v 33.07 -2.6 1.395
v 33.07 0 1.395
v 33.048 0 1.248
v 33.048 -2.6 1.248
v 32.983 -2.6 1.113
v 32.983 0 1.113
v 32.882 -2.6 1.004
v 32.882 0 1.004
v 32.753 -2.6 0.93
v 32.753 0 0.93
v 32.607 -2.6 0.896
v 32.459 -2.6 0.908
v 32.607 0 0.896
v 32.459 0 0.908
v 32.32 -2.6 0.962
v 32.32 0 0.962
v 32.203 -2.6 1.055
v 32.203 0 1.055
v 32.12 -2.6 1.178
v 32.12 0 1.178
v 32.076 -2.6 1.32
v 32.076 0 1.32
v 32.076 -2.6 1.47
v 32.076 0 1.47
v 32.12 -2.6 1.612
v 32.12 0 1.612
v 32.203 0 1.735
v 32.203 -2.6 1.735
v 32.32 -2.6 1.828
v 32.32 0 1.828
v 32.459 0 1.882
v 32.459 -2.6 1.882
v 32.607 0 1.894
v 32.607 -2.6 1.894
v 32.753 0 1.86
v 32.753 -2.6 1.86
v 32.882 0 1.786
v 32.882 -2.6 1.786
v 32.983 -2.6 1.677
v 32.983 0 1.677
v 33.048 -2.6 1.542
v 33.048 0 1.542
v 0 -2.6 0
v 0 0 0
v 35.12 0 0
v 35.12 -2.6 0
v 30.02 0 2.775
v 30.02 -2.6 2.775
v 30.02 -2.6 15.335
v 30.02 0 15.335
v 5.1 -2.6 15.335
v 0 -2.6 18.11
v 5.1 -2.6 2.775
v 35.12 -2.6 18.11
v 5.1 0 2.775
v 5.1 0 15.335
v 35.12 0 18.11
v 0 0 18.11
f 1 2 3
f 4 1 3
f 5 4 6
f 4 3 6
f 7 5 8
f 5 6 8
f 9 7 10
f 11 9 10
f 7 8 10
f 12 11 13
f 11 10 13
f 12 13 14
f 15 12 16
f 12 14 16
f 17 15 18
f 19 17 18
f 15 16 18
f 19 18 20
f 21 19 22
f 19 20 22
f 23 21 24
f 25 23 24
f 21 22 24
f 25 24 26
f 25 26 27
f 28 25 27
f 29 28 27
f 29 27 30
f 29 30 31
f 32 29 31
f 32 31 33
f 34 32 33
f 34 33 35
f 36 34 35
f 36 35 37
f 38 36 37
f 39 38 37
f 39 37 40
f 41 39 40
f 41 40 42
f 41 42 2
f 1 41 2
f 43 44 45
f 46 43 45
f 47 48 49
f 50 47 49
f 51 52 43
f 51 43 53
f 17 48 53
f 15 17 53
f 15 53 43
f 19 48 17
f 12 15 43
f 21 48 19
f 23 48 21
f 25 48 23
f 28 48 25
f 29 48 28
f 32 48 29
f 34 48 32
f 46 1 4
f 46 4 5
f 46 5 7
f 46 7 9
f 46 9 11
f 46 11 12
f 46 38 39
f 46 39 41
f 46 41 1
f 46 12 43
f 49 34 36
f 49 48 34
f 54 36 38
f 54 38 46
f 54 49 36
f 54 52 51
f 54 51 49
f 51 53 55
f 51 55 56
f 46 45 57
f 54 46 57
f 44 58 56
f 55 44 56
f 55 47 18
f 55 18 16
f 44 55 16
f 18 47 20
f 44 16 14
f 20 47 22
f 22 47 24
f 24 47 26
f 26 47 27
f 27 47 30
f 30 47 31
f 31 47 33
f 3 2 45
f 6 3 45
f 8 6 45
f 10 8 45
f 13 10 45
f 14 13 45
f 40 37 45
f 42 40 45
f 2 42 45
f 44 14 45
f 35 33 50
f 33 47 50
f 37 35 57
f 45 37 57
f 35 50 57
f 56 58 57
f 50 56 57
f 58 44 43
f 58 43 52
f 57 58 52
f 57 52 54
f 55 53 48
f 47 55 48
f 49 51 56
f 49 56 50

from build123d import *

# Parameters (mm, degrees)
SKETCH_W        = 35.12
SKETCH_H        = 18.11
PAD_DEPTH       = 2.6
SKETCH002_W     = 24.92
SKETCH002_H     = 12.56
POCKET_DEPTH    = 2.6
SKETCH003_R     = 0.5
SKETCH003_W     = 2.01
SKETCH003_H     = 3.5
POCKET001_DEPTH = 5


with BuildPart() as part:
    # Sketch → Pad (new body)
    with BuildSketch(Plane.XZ):
        with Locations((17.56, 9.055)):
            Rectangle(SKETCH_W, SKETCH_H)
    extrude(amount=PAD_DEPTH)

    # Sketch002 (on Face6 of Pad) → Pocket (cut)
    with BuildSketch(Plane.XZ.offset(2.6)):
        with Locations((17.56, 9.055)):
            Rectangle(SKETCH002_W, SKETCH002_H)
    extrude(amount=-POCKET_DEPTH, mode=Mode.SUBTRACT)

    # Sketch003 (on Face4 of Pocket) → Pocket001 (cut)
    with BuildSketch(Plane(origin=(0, 0, 0), x_dir=(1, 0, 0), z_dir=(0, 1, 0))):
        with Locations((32.57, -1.395)):
            Circle(SKETCH003_R)
        with Locations((27.953742, -8.544061)):
            Rectangle(SKETCH003_W, SKETCH003_H)
    extrude(amount=-POCKET001_DEPTH, mode=Mode.SUBTRACT)


solid = part.part
